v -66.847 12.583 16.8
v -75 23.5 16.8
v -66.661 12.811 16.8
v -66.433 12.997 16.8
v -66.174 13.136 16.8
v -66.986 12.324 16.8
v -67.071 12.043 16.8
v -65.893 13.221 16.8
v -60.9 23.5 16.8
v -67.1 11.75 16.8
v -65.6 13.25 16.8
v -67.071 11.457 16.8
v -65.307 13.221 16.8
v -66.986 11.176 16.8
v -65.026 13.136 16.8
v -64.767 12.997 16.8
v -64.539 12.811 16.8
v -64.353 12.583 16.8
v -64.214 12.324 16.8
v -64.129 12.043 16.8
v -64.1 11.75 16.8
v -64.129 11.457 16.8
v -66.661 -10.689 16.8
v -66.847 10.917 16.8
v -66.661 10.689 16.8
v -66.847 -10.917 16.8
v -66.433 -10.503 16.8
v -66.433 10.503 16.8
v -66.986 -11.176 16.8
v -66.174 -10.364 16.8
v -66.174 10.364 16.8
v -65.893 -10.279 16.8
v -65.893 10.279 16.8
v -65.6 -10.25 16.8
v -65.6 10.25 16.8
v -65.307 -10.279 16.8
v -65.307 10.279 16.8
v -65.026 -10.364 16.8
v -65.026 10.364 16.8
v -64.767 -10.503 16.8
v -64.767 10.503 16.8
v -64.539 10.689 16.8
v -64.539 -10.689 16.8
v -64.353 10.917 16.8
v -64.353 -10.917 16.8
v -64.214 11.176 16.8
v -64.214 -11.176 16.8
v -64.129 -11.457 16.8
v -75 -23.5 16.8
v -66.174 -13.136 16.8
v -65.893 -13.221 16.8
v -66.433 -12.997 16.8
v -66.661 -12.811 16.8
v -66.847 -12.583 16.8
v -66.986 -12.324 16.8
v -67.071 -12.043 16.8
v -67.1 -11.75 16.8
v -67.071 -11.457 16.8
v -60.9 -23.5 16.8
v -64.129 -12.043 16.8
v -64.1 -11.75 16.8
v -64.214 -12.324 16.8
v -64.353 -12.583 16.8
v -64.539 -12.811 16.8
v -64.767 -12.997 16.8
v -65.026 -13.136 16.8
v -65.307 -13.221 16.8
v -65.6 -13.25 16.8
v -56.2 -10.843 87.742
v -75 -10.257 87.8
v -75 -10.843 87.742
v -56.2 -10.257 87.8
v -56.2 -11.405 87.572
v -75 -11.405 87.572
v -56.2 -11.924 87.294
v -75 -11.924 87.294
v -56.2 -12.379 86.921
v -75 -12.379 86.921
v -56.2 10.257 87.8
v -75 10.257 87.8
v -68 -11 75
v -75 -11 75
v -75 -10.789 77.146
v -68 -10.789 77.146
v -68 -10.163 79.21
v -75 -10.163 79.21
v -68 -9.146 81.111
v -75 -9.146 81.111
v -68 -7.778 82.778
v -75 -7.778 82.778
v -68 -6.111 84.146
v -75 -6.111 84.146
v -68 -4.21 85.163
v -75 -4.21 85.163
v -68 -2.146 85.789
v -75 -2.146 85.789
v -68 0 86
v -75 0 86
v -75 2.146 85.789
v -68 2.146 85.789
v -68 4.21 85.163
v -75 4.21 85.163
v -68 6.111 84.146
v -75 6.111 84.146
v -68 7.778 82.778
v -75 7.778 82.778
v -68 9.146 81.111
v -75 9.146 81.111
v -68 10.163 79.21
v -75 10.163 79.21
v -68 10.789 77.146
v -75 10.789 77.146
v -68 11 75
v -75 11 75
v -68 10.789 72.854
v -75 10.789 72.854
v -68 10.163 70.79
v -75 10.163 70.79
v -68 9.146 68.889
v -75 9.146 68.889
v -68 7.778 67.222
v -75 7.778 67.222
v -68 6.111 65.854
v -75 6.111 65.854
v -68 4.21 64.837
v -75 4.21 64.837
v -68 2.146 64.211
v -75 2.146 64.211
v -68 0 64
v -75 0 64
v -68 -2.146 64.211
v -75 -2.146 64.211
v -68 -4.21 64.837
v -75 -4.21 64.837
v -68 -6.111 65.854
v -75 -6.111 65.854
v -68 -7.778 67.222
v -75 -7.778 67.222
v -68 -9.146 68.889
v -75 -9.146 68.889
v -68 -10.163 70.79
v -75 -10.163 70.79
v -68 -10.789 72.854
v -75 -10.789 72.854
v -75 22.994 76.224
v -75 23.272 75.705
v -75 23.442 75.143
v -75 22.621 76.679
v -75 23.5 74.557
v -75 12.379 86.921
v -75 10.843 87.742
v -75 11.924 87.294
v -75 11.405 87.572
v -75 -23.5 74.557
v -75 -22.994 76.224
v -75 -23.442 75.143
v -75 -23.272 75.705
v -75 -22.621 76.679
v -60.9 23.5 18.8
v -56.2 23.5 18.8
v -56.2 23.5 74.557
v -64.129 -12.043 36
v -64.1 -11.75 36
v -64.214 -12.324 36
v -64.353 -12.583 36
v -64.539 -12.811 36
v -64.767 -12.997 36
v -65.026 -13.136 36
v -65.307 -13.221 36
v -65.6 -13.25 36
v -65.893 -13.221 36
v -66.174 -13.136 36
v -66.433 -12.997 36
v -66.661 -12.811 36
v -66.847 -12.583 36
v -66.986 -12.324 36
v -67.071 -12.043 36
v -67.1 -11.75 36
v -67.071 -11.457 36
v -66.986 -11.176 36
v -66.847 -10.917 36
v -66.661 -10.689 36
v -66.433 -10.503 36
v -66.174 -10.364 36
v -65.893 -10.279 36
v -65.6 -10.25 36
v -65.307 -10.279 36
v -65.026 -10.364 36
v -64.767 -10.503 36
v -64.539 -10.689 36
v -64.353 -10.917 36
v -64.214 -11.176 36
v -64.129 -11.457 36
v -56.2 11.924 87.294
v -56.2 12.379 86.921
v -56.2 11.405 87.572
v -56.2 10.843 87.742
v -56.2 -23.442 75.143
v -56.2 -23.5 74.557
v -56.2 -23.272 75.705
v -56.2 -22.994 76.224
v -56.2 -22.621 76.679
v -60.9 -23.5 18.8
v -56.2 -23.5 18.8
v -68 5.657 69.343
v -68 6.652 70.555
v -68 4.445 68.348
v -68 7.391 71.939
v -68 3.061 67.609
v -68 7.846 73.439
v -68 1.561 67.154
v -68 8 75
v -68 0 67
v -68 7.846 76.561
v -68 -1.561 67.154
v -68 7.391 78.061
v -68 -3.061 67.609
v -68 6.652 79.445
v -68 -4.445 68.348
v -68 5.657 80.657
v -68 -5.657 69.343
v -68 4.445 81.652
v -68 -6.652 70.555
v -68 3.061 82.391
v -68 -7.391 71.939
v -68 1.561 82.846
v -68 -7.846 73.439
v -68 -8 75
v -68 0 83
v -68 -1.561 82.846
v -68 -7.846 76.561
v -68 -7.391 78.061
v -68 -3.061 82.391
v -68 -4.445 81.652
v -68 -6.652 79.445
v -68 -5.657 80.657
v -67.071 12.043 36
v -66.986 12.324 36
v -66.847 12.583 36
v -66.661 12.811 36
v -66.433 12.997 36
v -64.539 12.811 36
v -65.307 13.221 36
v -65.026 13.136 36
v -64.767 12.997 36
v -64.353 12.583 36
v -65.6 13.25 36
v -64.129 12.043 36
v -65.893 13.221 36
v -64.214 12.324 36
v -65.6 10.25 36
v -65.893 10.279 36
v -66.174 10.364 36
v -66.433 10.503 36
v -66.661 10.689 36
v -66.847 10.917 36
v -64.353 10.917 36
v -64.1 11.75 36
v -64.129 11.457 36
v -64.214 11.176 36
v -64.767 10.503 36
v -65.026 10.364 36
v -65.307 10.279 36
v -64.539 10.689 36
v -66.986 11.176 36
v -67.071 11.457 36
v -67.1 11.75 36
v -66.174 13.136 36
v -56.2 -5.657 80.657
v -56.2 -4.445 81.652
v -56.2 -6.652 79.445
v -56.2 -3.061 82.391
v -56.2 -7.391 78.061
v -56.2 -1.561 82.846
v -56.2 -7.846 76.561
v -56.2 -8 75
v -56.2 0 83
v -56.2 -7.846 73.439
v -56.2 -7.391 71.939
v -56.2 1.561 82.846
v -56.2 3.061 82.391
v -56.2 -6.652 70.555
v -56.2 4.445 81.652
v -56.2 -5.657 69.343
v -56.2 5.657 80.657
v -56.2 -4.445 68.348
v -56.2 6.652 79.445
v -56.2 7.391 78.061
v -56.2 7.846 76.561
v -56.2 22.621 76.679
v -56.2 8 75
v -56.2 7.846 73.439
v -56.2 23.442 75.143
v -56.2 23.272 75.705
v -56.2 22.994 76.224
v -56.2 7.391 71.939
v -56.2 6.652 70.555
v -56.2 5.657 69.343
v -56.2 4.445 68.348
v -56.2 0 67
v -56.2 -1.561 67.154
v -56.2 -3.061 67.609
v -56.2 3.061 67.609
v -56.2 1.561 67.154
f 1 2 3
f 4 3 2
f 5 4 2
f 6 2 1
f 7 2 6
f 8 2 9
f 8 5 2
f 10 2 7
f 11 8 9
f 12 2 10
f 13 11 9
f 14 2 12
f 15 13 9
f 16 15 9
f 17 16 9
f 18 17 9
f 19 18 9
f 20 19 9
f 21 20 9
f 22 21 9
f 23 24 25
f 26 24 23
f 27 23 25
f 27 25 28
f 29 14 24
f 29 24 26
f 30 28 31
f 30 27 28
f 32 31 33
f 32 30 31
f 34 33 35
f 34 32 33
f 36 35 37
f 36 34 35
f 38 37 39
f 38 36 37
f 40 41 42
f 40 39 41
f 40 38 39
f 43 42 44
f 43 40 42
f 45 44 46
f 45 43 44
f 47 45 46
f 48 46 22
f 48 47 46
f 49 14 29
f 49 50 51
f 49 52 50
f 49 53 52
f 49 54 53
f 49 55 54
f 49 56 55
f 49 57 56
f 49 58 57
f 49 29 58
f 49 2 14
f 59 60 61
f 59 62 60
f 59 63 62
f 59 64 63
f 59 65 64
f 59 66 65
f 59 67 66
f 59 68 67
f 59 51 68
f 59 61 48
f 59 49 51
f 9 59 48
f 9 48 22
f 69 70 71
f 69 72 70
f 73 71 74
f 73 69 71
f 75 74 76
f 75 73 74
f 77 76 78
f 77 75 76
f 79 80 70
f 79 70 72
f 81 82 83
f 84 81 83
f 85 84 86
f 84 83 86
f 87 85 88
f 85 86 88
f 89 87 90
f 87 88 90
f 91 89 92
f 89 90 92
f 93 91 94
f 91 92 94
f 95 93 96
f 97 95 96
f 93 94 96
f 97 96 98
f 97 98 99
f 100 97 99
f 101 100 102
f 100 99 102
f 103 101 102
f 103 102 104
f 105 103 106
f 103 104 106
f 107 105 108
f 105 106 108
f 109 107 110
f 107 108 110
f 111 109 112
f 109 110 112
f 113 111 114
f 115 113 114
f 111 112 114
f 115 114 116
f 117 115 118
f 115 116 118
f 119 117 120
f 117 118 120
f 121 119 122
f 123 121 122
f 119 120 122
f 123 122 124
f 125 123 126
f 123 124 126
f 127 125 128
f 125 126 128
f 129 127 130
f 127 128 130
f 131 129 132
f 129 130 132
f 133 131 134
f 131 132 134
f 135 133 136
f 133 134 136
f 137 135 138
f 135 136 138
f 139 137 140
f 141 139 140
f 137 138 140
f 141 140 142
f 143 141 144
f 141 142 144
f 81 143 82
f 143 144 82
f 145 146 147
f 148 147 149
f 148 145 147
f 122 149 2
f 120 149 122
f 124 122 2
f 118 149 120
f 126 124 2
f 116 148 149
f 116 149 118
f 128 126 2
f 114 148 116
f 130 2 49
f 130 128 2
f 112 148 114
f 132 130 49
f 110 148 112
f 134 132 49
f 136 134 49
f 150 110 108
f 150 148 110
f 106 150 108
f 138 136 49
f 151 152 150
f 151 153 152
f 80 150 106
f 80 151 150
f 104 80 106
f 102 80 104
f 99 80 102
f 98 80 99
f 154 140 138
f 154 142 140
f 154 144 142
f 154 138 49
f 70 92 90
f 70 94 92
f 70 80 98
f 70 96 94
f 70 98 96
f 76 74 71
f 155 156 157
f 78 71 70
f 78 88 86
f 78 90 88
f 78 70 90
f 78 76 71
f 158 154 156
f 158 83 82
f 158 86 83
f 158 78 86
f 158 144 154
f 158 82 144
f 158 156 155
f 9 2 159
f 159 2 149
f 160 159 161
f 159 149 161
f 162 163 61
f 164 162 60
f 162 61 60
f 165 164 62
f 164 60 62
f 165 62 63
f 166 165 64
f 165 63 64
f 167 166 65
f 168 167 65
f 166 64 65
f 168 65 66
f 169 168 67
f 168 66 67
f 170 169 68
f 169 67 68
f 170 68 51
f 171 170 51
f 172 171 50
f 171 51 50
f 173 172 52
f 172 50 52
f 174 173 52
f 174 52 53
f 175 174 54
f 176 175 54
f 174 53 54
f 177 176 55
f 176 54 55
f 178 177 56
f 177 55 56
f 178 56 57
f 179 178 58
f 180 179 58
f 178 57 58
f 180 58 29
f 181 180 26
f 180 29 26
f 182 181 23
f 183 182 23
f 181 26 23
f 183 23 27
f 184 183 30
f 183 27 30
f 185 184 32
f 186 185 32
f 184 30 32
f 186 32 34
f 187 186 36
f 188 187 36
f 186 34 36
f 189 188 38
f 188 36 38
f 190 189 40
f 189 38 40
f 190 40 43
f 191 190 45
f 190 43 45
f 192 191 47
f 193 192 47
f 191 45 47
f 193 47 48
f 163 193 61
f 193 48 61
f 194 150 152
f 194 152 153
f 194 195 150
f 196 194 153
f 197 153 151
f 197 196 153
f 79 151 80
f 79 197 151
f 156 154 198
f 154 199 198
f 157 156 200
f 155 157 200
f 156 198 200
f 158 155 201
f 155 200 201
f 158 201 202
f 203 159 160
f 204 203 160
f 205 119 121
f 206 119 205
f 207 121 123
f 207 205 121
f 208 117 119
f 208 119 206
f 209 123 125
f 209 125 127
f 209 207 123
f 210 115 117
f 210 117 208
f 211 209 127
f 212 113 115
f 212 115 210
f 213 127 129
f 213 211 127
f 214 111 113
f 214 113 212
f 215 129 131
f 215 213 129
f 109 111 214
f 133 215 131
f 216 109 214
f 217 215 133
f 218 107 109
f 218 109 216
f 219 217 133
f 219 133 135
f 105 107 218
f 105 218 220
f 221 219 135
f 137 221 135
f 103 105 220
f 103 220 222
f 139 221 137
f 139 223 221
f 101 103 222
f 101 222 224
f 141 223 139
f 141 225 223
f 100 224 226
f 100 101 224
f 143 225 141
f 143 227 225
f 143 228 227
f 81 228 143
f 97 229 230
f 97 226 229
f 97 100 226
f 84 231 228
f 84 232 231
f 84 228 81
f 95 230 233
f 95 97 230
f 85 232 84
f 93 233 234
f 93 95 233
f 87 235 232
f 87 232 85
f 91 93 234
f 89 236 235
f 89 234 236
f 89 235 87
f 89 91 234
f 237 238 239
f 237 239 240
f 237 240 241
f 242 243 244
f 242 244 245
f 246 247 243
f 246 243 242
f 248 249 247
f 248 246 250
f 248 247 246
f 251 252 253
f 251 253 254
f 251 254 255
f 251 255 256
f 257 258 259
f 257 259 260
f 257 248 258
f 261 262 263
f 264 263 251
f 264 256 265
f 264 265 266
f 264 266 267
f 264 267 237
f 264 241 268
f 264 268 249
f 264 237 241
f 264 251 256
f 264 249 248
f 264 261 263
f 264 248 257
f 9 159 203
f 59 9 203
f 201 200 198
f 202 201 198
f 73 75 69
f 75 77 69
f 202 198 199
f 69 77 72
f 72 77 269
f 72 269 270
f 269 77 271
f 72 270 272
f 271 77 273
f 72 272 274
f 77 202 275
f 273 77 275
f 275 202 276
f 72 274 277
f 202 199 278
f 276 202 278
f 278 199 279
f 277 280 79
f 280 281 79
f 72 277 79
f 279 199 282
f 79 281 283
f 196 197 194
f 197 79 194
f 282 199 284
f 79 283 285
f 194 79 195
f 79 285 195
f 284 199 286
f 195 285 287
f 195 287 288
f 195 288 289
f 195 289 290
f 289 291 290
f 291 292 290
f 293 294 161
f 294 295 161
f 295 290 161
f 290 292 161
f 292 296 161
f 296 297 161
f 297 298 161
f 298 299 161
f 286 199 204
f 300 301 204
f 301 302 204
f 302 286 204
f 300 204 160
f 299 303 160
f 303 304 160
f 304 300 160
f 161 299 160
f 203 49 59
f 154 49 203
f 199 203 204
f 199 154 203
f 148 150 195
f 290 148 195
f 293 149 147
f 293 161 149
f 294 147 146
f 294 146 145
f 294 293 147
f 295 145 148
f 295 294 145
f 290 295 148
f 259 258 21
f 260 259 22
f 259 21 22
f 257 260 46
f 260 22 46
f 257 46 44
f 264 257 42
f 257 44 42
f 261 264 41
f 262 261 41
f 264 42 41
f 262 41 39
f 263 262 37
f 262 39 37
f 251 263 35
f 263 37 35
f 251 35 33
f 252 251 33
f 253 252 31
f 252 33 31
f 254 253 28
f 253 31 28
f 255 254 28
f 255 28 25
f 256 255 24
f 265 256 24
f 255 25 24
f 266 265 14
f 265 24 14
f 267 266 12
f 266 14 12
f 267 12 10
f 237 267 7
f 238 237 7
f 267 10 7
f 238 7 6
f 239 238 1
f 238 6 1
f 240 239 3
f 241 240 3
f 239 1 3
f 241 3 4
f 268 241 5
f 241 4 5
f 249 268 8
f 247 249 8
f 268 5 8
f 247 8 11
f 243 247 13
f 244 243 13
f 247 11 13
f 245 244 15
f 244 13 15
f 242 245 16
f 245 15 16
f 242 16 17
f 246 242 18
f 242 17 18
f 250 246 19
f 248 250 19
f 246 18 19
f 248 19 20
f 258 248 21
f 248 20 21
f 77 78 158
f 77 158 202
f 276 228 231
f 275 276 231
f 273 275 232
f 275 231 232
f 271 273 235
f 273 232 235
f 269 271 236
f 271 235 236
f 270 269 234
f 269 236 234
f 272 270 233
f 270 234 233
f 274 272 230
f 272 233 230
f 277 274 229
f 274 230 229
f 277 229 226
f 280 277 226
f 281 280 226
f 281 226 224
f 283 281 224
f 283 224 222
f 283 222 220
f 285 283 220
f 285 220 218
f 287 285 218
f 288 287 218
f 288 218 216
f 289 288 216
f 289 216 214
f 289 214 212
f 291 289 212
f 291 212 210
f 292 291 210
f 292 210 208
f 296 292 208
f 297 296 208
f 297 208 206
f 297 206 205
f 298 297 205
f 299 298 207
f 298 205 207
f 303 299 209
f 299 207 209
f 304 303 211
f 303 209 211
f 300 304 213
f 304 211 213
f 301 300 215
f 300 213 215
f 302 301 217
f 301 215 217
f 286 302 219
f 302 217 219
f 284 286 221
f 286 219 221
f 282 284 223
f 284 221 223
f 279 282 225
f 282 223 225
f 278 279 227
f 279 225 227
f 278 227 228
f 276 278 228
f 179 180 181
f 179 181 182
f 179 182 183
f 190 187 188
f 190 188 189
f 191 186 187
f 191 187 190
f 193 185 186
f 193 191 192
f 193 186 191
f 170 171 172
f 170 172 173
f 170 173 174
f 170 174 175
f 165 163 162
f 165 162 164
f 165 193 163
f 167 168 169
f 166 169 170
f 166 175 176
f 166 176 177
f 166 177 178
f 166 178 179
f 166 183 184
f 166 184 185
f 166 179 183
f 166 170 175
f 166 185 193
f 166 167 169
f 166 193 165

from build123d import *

# Parameters (mm, degrees)
SKETCH012_W     = 18.8
SKETCH012_H     = 47
PAD008_DEPTH    = 69
SKETCH036_W     = 14.1
SKETCH036_H     = 47
PAD016_DEPTH    = 2
SKETCH054_R     = 8
POCKET021_DEPTH = 18.801
SKETCH055_R     = 11
POCKET022_DEPTH = 7
CHAMFER001_SIZE = 12
SKETCH073_R     = 1.5
POCKET028_DEPTH = 19.2
FILLET003_R     = 3


with BuildPart() as part:
    # Sketch012 (on Face1 of ReferencePad001) → Pad008 (new body)
    with BuildSketch(Plane.XY.offset(18.8)):
        with Locations((-65.6, 0)):
            Rectangle(SKETCH012_W, SKETCH012_H)
    extrude(amount=PAD008_DEPTH)

    # Sketch036 (on Face5 of Pad008) → Pad016 (join)
    with BuildSketch(Plane(origin=(0, 0, 18.8), x_dir=(1, 0, 0), z_dir=(0, 0, -1))):
        with Locations((-67.95, 0)):
            Rectangle(SKETCH036_W, SKETCH036_H)
    extrude(amount=PAD016_DEPTH)

    # Sketch054 (on Face5 of Pad016) → Pocket021 (cut, through all)
    with BuildSketch(Plane(origin=(-75, 0, 18.8), x_dir=(0, -1, 0), z_dir=(-1, 0, 0))):
        with Locations((0, 56.2)):
            Circle(SKETCH054_R)
    extrude(amount=-POCKET021_DEPTH, mode=Mode.SUBTRACT)

    # Sketch055 (on Face5 of Pocket021) → Pocket022 (cut)
    with BuildSketch(Plane(origin=(-75, 0, 18.8), x_dir=(0, -1, 0), z_dir=(-1, 0, 0))):
        with Locations((0, 56.2)):
            Circle(SKETCH055_R)
    extrude(amount=-POCKET022_DEPTH, mode=Mode.SUBTRACT)

    # Chamfer001
    chamfer001_edges = [part.edges().sort_by_distance(p)[0] for p in [
        (-65.6, -23.5, 87.8),
        (-65.6, 23.5, 87.8),
    ]]
    chamfer(chamfer001_edges, length=CHAMFER001_SIZE)

    # Sketch073 (on Face16 of Chamfer001) → Pocket028 (cut)
    with BuildSketch(Plane(origin=(0, 0, 16.8), x_dir=(1, 0, 0), z_dir=(0, 0, -1))):
        with Locations((-65.6, 11.75)):
            Circle(SKETCH073_R)
        with Locations((-65.6, -11.75)):
            Circle(SKETCH073_R)
    extrude(amount=-POCKET028_DEPTH, mode=Mode.SUBTRACT)

    # Fillet003
    fillet003_edges = [part.edges().sort_by_distance(p)[0] for p in [
        (-65.6, 23.5, 75.8),
        (-65.6, 11.5, 87.8),
        (-65.6, -11.5, 87.8),
        (-65.6, -23.5, 75.8),
    ]]
    fillet(fillet003_edges, radius=FILLET003_R)


solid = part.part
